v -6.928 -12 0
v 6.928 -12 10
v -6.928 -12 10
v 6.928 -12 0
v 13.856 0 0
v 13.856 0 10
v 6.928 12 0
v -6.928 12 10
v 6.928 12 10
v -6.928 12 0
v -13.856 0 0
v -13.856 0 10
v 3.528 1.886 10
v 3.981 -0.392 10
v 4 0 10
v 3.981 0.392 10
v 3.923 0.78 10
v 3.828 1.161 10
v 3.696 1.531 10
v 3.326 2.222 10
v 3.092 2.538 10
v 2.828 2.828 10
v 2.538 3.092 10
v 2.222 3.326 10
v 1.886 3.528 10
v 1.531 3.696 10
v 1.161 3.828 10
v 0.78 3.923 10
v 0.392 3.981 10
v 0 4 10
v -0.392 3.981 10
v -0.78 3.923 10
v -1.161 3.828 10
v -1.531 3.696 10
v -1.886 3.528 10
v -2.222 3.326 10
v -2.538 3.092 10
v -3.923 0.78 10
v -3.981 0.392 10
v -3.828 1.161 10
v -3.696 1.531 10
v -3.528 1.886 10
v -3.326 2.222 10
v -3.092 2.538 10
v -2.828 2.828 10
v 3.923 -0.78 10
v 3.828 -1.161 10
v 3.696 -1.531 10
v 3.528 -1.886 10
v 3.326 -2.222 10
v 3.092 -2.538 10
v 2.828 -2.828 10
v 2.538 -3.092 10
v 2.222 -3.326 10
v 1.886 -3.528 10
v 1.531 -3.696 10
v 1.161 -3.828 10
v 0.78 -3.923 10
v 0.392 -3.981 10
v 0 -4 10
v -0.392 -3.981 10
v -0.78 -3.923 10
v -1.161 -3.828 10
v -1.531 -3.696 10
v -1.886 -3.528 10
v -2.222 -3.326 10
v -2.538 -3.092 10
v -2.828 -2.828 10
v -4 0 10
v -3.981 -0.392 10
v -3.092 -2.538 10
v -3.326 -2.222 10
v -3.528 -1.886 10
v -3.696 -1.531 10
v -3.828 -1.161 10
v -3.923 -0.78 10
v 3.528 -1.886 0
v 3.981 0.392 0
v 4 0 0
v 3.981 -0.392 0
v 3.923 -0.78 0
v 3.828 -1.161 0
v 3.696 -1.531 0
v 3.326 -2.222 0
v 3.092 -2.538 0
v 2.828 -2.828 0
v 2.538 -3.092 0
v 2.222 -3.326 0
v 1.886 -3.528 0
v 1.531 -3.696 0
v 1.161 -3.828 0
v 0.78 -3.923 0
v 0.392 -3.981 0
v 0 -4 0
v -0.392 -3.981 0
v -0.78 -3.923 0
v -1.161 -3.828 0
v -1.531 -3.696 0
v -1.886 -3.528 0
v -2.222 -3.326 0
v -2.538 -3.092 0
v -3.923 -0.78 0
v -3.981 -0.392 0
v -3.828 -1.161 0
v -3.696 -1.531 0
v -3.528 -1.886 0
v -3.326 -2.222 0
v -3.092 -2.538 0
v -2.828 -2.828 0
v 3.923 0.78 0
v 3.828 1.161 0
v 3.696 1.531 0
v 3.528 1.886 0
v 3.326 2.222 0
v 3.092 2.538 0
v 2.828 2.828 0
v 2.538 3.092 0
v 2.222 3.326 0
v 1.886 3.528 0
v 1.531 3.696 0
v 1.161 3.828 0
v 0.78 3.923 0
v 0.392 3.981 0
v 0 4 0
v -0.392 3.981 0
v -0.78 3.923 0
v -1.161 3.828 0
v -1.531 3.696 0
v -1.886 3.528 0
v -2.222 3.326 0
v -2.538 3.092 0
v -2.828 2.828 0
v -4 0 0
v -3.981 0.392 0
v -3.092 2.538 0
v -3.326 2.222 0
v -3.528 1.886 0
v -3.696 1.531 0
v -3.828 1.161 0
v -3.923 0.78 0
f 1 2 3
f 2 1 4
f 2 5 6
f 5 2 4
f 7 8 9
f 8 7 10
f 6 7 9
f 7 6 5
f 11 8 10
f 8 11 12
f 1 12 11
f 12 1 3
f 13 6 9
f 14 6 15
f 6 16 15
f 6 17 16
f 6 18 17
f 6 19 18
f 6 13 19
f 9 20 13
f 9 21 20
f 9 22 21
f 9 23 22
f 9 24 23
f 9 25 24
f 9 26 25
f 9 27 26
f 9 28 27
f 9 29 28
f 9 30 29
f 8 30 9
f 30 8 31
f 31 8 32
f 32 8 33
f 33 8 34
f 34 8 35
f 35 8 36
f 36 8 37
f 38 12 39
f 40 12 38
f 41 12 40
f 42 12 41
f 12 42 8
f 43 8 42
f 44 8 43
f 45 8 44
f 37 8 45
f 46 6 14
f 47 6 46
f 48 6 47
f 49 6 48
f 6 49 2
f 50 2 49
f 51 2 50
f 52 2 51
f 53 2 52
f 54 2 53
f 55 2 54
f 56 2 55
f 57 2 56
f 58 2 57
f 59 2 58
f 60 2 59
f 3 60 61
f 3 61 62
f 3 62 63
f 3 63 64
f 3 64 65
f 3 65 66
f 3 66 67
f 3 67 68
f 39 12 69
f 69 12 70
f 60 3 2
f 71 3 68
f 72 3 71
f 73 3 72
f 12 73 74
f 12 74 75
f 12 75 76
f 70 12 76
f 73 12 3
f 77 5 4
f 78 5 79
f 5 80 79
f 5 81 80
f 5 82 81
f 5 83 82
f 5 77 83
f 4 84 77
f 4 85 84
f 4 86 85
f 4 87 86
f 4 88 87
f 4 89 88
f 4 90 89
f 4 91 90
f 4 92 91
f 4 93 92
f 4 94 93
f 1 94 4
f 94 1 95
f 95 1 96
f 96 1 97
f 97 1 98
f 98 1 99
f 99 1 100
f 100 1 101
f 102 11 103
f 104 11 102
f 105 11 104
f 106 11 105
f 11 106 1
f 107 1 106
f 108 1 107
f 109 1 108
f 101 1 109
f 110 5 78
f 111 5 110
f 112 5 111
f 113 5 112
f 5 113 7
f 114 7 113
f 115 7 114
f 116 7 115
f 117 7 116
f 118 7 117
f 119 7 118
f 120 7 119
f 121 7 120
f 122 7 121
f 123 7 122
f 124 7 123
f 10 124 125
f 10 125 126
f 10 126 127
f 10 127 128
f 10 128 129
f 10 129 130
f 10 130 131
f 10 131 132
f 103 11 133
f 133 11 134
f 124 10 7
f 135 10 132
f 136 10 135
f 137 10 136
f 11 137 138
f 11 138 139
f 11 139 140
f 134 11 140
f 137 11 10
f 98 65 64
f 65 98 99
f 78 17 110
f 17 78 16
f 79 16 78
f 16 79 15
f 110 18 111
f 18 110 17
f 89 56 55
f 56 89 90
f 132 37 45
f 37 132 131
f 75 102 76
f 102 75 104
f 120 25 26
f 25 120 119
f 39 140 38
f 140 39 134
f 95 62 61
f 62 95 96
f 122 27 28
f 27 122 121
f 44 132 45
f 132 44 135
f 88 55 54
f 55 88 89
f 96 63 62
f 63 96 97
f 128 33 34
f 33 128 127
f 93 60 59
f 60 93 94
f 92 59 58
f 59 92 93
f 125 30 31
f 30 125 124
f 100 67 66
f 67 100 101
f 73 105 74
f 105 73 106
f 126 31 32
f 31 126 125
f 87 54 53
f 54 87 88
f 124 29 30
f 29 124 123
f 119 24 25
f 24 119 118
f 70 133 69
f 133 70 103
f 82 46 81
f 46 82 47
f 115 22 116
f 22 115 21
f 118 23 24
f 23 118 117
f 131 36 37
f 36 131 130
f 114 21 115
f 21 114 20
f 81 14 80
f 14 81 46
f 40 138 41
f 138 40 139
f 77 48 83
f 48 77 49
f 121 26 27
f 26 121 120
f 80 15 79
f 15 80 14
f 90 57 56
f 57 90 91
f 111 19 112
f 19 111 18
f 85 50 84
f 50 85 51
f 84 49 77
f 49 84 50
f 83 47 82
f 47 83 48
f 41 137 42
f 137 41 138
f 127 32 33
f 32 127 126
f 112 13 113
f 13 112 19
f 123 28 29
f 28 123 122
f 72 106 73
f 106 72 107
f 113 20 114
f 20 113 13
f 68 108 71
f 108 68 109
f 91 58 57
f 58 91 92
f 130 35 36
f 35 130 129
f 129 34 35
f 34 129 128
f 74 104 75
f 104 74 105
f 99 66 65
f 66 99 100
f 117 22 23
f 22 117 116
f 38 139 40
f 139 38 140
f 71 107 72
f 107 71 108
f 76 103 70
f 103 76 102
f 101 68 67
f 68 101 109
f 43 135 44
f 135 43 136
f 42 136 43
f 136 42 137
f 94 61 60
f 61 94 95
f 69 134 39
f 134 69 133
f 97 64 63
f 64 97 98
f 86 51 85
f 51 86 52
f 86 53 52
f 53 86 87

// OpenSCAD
// Generated with SolidPython2 for OpenSCAD task-018
$fn = 64;

difference() {
	translate(v = [0, 0, 0]) {
		cylinder($fn = 6, h = 10, r = 13.85640646055102);
	}
	translate(v = [0, 0, -1]) {
		cylinder(h = 12, r = 4.0);
	}
}
